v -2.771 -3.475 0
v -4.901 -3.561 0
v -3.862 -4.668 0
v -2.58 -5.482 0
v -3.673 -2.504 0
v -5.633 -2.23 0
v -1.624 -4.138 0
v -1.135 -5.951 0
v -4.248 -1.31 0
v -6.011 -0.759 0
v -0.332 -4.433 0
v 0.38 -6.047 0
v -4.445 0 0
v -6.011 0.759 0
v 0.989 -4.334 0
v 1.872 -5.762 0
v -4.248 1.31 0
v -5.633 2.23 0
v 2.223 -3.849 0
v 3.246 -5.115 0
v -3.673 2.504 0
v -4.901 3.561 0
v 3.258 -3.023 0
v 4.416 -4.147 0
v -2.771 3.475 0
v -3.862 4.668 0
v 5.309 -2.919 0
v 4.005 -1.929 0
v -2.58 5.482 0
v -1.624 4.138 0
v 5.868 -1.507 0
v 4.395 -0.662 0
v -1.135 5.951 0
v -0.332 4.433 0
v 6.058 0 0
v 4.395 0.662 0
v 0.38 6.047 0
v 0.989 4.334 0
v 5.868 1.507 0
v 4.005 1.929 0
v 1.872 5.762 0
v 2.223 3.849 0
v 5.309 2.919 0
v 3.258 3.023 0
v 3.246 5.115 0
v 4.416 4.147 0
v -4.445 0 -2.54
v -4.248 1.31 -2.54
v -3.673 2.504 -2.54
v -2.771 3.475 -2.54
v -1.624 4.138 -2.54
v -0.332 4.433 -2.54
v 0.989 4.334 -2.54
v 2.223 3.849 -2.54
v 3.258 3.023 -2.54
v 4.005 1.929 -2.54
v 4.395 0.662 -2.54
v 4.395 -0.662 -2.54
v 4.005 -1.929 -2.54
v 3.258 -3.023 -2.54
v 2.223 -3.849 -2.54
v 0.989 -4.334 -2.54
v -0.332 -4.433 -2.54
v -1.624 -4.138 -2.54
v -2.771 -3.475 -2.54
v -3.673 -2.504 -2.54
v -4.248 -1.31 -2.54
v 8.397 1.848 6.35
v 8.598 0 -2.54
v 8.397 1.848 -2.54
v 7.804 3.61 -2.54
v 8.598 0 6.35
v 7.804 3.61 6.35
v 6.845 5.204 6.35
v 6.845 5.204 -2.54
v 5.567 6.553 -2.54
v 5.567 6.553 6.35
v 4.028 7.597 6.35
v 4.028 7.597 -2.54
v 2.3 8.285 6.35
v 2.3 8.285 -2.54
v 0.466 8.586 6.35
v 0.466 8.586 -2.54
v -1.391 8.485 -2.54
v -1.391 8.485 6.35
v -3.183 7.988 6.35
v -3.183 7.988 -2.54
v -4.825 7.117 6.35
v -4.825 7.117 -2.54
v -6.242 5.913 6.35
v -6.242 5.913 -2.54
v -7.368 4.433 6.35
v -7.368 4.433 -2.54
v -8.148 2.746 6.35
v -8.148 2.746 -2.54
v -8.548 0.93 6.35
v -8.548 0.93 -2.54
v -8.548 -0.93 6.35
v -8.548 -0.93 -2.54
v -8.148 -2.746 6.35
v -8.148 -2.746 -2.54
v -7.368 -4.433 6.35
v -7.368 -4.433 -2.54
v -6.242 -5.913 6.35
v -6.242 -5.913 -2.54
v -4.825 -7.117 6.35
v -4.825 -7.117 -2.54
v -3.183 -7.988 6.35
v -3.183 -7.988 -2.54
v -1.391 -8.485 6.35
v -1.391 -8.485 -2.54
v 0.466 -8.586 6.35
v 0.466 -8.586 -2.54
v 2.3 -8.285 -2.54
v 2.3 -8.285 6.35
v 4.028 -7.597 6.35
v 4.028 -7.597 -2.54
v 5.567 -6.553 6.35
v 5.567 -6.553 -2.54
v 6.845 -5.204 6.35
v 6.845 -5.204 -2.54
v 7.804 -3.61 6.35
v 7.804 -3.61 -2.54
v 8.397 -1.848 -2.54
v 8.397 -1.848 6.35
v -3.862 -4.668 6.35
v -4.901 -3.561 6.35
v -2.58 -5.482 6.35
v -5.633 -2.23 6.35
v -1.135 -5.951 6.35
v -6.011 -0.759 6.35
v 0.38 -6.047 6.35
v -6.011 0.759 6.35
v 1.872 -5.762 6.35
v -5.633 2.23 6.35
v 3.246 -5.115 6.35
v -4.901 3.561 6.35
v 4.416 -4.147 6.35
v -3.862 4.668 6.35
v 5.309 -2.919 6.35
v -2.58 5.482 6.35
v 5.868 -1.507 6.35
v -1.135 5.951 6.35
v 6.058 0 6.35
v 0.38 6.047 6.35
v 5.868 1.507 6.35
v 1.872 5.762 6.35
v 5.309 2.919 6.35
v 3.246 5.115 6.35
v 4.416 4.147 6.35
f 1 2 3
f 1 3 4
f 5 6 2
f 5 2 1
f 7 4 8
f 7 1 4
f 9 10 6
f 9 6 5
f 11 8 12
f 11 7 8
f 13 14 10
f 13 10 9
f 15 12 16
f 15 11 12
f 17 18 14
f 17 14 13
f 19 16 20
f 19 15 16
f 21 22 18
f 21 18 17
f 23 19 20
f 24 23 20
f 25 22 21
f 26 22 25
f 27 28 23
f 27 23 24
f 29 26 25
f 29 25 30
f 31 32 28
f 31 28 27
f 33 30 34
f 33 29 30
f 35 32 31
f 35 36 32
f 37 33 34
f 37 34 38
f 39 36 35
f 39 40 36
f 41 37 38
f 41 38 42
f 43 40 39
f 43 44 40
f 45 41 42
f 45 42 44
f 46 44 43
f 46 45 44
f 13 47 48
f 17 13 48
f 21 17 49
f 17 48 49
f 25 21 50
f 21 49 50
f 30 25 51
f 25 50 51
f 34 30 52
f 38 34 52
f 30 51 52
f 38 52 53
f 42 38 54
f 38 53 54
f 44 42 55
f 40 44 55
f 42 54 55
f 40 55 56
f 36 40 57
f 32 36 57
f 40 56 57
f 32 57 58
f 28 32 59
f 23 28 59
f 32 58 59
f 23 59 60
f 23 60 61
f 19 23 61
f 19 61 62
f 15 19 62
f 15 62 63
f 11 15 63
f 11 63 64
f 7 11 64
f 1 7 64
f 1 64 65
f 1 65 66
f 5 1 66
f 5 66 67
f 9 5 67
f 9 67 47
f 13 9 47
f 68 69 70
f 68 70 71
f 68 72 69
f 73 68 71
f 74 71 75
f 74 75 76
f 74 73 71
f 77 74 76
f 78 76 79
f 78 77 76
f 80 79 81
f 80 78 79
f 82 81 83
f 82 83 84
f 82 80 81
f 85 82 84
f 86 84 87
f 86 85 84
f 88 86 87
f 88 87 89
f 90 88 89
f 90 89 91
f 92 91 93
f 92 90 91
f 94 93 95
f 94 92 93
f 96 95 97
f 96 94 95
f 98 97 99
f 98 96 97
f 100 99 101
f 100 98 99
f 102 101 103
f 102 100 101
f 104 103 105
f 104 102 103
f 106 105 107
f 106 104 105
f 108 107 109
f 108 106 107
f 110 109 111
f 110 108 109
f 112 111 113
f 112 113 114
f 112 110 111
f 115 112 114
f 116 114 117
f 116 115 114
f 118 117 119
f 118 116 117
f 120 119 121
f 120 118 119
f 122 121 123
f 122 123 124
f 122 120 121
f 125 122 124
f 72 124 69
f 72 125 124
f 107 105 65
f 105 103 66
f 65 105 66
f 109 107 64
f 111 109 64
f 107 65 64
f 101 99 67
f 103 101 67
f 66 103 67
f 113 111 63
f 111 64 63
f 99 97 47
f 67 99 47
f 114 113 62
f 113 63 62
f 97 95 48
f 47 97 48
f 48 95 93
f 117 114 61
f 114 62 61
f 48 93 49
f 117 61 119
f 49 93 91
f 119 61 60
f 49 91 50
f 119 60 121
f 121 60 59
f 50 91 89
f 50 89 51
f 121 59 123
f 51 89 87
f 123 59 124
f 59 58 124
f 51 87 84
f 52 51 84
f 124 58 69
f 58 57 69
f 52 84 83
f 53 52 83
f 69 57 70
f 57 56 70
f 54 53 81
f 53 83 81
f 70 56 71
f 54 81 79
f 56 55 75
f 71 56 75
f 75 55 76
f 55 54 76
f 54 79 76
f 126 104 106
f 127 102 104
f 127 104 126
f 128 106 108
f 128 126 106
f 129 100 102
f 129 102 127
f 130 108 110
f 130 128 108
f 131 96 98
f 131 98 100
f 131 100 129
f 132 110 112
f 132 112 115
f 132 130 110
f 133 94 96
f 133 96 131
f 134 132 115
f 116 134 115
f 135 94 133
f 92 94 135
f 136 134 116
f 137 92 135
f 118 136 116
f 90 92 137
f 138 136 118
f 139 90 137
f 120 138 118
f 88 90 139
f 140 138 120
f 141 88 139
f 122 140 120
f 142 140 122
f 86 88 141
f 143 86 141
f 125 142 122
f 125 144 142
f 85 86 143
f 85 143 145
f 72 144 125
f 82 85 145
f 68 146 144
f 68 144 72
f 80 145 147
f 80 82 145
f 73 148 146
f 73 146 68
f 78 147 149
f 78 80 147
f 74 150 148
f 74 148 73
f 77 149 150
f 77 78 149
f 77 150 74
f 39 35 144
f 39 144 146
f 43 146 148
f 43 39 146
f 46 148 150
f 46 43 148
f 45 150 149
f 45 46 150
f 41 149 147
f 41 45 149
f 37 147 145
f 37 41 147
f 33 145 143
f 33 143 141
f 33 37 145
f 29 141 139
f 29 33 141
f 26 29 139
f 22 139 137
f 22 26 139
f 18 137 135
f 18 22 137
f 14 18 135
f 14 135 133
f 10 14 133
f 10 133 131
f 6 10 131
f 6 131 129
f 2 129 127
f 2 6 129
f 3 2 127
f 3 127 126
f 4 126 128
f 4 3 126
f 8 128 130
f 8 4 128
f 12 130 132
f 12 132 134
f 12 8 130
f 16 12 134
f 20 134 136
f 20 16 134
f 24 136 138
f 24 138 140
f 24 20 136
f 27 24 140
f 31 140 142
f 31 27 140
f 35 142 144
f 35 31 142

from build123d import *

# Parameters (mm, degrees)
SKETCH1_R           = 8.598499948
SKETCH1_R_2         = 6.058499948
BOSS_EXTRUDE1_DEPTH = 6.35
SKETCH2_R           = 8.598499948
BOSS_EXTRUDE2_DEPTH = 2.54
SKETCH3_R           = 4.445
CUT_EXTRUDE1_DEPTH  = 9.89


with BuildPart() as part:
    # Sketch1 → Boss-Extrude1 (new body)
    with BuildSketch(Plane.XY):
        Circle(SKETCH1_R)
        Circle(SKETCH1_R_2, mode=Mode.SUBTRACT)
    extrude(amount=BOSS_EXTRUDE1_DEPTH)

    # Sketch2 → Boss-Extrude2 (add)
    with BuildSketch(Plane.XY):
        Circle(SKETCH2_R)
    extrude(amount=-BOSS_EXTRUDE2_DEPTH)

    # Sketch3 → Cut-Extrude1 (cut, through all)
    with BuildSketch(Plane(origin=(0, 0, -2.54), x_dir=(-1, 0, 0), z_dir=(0, 0, -1))):
        Circle(SKETCH3_R)
    extrude(amount=-CUT_EXTRUDE1_DEPTH, mode=Mode.SUBTRACT)


solid = part.part
